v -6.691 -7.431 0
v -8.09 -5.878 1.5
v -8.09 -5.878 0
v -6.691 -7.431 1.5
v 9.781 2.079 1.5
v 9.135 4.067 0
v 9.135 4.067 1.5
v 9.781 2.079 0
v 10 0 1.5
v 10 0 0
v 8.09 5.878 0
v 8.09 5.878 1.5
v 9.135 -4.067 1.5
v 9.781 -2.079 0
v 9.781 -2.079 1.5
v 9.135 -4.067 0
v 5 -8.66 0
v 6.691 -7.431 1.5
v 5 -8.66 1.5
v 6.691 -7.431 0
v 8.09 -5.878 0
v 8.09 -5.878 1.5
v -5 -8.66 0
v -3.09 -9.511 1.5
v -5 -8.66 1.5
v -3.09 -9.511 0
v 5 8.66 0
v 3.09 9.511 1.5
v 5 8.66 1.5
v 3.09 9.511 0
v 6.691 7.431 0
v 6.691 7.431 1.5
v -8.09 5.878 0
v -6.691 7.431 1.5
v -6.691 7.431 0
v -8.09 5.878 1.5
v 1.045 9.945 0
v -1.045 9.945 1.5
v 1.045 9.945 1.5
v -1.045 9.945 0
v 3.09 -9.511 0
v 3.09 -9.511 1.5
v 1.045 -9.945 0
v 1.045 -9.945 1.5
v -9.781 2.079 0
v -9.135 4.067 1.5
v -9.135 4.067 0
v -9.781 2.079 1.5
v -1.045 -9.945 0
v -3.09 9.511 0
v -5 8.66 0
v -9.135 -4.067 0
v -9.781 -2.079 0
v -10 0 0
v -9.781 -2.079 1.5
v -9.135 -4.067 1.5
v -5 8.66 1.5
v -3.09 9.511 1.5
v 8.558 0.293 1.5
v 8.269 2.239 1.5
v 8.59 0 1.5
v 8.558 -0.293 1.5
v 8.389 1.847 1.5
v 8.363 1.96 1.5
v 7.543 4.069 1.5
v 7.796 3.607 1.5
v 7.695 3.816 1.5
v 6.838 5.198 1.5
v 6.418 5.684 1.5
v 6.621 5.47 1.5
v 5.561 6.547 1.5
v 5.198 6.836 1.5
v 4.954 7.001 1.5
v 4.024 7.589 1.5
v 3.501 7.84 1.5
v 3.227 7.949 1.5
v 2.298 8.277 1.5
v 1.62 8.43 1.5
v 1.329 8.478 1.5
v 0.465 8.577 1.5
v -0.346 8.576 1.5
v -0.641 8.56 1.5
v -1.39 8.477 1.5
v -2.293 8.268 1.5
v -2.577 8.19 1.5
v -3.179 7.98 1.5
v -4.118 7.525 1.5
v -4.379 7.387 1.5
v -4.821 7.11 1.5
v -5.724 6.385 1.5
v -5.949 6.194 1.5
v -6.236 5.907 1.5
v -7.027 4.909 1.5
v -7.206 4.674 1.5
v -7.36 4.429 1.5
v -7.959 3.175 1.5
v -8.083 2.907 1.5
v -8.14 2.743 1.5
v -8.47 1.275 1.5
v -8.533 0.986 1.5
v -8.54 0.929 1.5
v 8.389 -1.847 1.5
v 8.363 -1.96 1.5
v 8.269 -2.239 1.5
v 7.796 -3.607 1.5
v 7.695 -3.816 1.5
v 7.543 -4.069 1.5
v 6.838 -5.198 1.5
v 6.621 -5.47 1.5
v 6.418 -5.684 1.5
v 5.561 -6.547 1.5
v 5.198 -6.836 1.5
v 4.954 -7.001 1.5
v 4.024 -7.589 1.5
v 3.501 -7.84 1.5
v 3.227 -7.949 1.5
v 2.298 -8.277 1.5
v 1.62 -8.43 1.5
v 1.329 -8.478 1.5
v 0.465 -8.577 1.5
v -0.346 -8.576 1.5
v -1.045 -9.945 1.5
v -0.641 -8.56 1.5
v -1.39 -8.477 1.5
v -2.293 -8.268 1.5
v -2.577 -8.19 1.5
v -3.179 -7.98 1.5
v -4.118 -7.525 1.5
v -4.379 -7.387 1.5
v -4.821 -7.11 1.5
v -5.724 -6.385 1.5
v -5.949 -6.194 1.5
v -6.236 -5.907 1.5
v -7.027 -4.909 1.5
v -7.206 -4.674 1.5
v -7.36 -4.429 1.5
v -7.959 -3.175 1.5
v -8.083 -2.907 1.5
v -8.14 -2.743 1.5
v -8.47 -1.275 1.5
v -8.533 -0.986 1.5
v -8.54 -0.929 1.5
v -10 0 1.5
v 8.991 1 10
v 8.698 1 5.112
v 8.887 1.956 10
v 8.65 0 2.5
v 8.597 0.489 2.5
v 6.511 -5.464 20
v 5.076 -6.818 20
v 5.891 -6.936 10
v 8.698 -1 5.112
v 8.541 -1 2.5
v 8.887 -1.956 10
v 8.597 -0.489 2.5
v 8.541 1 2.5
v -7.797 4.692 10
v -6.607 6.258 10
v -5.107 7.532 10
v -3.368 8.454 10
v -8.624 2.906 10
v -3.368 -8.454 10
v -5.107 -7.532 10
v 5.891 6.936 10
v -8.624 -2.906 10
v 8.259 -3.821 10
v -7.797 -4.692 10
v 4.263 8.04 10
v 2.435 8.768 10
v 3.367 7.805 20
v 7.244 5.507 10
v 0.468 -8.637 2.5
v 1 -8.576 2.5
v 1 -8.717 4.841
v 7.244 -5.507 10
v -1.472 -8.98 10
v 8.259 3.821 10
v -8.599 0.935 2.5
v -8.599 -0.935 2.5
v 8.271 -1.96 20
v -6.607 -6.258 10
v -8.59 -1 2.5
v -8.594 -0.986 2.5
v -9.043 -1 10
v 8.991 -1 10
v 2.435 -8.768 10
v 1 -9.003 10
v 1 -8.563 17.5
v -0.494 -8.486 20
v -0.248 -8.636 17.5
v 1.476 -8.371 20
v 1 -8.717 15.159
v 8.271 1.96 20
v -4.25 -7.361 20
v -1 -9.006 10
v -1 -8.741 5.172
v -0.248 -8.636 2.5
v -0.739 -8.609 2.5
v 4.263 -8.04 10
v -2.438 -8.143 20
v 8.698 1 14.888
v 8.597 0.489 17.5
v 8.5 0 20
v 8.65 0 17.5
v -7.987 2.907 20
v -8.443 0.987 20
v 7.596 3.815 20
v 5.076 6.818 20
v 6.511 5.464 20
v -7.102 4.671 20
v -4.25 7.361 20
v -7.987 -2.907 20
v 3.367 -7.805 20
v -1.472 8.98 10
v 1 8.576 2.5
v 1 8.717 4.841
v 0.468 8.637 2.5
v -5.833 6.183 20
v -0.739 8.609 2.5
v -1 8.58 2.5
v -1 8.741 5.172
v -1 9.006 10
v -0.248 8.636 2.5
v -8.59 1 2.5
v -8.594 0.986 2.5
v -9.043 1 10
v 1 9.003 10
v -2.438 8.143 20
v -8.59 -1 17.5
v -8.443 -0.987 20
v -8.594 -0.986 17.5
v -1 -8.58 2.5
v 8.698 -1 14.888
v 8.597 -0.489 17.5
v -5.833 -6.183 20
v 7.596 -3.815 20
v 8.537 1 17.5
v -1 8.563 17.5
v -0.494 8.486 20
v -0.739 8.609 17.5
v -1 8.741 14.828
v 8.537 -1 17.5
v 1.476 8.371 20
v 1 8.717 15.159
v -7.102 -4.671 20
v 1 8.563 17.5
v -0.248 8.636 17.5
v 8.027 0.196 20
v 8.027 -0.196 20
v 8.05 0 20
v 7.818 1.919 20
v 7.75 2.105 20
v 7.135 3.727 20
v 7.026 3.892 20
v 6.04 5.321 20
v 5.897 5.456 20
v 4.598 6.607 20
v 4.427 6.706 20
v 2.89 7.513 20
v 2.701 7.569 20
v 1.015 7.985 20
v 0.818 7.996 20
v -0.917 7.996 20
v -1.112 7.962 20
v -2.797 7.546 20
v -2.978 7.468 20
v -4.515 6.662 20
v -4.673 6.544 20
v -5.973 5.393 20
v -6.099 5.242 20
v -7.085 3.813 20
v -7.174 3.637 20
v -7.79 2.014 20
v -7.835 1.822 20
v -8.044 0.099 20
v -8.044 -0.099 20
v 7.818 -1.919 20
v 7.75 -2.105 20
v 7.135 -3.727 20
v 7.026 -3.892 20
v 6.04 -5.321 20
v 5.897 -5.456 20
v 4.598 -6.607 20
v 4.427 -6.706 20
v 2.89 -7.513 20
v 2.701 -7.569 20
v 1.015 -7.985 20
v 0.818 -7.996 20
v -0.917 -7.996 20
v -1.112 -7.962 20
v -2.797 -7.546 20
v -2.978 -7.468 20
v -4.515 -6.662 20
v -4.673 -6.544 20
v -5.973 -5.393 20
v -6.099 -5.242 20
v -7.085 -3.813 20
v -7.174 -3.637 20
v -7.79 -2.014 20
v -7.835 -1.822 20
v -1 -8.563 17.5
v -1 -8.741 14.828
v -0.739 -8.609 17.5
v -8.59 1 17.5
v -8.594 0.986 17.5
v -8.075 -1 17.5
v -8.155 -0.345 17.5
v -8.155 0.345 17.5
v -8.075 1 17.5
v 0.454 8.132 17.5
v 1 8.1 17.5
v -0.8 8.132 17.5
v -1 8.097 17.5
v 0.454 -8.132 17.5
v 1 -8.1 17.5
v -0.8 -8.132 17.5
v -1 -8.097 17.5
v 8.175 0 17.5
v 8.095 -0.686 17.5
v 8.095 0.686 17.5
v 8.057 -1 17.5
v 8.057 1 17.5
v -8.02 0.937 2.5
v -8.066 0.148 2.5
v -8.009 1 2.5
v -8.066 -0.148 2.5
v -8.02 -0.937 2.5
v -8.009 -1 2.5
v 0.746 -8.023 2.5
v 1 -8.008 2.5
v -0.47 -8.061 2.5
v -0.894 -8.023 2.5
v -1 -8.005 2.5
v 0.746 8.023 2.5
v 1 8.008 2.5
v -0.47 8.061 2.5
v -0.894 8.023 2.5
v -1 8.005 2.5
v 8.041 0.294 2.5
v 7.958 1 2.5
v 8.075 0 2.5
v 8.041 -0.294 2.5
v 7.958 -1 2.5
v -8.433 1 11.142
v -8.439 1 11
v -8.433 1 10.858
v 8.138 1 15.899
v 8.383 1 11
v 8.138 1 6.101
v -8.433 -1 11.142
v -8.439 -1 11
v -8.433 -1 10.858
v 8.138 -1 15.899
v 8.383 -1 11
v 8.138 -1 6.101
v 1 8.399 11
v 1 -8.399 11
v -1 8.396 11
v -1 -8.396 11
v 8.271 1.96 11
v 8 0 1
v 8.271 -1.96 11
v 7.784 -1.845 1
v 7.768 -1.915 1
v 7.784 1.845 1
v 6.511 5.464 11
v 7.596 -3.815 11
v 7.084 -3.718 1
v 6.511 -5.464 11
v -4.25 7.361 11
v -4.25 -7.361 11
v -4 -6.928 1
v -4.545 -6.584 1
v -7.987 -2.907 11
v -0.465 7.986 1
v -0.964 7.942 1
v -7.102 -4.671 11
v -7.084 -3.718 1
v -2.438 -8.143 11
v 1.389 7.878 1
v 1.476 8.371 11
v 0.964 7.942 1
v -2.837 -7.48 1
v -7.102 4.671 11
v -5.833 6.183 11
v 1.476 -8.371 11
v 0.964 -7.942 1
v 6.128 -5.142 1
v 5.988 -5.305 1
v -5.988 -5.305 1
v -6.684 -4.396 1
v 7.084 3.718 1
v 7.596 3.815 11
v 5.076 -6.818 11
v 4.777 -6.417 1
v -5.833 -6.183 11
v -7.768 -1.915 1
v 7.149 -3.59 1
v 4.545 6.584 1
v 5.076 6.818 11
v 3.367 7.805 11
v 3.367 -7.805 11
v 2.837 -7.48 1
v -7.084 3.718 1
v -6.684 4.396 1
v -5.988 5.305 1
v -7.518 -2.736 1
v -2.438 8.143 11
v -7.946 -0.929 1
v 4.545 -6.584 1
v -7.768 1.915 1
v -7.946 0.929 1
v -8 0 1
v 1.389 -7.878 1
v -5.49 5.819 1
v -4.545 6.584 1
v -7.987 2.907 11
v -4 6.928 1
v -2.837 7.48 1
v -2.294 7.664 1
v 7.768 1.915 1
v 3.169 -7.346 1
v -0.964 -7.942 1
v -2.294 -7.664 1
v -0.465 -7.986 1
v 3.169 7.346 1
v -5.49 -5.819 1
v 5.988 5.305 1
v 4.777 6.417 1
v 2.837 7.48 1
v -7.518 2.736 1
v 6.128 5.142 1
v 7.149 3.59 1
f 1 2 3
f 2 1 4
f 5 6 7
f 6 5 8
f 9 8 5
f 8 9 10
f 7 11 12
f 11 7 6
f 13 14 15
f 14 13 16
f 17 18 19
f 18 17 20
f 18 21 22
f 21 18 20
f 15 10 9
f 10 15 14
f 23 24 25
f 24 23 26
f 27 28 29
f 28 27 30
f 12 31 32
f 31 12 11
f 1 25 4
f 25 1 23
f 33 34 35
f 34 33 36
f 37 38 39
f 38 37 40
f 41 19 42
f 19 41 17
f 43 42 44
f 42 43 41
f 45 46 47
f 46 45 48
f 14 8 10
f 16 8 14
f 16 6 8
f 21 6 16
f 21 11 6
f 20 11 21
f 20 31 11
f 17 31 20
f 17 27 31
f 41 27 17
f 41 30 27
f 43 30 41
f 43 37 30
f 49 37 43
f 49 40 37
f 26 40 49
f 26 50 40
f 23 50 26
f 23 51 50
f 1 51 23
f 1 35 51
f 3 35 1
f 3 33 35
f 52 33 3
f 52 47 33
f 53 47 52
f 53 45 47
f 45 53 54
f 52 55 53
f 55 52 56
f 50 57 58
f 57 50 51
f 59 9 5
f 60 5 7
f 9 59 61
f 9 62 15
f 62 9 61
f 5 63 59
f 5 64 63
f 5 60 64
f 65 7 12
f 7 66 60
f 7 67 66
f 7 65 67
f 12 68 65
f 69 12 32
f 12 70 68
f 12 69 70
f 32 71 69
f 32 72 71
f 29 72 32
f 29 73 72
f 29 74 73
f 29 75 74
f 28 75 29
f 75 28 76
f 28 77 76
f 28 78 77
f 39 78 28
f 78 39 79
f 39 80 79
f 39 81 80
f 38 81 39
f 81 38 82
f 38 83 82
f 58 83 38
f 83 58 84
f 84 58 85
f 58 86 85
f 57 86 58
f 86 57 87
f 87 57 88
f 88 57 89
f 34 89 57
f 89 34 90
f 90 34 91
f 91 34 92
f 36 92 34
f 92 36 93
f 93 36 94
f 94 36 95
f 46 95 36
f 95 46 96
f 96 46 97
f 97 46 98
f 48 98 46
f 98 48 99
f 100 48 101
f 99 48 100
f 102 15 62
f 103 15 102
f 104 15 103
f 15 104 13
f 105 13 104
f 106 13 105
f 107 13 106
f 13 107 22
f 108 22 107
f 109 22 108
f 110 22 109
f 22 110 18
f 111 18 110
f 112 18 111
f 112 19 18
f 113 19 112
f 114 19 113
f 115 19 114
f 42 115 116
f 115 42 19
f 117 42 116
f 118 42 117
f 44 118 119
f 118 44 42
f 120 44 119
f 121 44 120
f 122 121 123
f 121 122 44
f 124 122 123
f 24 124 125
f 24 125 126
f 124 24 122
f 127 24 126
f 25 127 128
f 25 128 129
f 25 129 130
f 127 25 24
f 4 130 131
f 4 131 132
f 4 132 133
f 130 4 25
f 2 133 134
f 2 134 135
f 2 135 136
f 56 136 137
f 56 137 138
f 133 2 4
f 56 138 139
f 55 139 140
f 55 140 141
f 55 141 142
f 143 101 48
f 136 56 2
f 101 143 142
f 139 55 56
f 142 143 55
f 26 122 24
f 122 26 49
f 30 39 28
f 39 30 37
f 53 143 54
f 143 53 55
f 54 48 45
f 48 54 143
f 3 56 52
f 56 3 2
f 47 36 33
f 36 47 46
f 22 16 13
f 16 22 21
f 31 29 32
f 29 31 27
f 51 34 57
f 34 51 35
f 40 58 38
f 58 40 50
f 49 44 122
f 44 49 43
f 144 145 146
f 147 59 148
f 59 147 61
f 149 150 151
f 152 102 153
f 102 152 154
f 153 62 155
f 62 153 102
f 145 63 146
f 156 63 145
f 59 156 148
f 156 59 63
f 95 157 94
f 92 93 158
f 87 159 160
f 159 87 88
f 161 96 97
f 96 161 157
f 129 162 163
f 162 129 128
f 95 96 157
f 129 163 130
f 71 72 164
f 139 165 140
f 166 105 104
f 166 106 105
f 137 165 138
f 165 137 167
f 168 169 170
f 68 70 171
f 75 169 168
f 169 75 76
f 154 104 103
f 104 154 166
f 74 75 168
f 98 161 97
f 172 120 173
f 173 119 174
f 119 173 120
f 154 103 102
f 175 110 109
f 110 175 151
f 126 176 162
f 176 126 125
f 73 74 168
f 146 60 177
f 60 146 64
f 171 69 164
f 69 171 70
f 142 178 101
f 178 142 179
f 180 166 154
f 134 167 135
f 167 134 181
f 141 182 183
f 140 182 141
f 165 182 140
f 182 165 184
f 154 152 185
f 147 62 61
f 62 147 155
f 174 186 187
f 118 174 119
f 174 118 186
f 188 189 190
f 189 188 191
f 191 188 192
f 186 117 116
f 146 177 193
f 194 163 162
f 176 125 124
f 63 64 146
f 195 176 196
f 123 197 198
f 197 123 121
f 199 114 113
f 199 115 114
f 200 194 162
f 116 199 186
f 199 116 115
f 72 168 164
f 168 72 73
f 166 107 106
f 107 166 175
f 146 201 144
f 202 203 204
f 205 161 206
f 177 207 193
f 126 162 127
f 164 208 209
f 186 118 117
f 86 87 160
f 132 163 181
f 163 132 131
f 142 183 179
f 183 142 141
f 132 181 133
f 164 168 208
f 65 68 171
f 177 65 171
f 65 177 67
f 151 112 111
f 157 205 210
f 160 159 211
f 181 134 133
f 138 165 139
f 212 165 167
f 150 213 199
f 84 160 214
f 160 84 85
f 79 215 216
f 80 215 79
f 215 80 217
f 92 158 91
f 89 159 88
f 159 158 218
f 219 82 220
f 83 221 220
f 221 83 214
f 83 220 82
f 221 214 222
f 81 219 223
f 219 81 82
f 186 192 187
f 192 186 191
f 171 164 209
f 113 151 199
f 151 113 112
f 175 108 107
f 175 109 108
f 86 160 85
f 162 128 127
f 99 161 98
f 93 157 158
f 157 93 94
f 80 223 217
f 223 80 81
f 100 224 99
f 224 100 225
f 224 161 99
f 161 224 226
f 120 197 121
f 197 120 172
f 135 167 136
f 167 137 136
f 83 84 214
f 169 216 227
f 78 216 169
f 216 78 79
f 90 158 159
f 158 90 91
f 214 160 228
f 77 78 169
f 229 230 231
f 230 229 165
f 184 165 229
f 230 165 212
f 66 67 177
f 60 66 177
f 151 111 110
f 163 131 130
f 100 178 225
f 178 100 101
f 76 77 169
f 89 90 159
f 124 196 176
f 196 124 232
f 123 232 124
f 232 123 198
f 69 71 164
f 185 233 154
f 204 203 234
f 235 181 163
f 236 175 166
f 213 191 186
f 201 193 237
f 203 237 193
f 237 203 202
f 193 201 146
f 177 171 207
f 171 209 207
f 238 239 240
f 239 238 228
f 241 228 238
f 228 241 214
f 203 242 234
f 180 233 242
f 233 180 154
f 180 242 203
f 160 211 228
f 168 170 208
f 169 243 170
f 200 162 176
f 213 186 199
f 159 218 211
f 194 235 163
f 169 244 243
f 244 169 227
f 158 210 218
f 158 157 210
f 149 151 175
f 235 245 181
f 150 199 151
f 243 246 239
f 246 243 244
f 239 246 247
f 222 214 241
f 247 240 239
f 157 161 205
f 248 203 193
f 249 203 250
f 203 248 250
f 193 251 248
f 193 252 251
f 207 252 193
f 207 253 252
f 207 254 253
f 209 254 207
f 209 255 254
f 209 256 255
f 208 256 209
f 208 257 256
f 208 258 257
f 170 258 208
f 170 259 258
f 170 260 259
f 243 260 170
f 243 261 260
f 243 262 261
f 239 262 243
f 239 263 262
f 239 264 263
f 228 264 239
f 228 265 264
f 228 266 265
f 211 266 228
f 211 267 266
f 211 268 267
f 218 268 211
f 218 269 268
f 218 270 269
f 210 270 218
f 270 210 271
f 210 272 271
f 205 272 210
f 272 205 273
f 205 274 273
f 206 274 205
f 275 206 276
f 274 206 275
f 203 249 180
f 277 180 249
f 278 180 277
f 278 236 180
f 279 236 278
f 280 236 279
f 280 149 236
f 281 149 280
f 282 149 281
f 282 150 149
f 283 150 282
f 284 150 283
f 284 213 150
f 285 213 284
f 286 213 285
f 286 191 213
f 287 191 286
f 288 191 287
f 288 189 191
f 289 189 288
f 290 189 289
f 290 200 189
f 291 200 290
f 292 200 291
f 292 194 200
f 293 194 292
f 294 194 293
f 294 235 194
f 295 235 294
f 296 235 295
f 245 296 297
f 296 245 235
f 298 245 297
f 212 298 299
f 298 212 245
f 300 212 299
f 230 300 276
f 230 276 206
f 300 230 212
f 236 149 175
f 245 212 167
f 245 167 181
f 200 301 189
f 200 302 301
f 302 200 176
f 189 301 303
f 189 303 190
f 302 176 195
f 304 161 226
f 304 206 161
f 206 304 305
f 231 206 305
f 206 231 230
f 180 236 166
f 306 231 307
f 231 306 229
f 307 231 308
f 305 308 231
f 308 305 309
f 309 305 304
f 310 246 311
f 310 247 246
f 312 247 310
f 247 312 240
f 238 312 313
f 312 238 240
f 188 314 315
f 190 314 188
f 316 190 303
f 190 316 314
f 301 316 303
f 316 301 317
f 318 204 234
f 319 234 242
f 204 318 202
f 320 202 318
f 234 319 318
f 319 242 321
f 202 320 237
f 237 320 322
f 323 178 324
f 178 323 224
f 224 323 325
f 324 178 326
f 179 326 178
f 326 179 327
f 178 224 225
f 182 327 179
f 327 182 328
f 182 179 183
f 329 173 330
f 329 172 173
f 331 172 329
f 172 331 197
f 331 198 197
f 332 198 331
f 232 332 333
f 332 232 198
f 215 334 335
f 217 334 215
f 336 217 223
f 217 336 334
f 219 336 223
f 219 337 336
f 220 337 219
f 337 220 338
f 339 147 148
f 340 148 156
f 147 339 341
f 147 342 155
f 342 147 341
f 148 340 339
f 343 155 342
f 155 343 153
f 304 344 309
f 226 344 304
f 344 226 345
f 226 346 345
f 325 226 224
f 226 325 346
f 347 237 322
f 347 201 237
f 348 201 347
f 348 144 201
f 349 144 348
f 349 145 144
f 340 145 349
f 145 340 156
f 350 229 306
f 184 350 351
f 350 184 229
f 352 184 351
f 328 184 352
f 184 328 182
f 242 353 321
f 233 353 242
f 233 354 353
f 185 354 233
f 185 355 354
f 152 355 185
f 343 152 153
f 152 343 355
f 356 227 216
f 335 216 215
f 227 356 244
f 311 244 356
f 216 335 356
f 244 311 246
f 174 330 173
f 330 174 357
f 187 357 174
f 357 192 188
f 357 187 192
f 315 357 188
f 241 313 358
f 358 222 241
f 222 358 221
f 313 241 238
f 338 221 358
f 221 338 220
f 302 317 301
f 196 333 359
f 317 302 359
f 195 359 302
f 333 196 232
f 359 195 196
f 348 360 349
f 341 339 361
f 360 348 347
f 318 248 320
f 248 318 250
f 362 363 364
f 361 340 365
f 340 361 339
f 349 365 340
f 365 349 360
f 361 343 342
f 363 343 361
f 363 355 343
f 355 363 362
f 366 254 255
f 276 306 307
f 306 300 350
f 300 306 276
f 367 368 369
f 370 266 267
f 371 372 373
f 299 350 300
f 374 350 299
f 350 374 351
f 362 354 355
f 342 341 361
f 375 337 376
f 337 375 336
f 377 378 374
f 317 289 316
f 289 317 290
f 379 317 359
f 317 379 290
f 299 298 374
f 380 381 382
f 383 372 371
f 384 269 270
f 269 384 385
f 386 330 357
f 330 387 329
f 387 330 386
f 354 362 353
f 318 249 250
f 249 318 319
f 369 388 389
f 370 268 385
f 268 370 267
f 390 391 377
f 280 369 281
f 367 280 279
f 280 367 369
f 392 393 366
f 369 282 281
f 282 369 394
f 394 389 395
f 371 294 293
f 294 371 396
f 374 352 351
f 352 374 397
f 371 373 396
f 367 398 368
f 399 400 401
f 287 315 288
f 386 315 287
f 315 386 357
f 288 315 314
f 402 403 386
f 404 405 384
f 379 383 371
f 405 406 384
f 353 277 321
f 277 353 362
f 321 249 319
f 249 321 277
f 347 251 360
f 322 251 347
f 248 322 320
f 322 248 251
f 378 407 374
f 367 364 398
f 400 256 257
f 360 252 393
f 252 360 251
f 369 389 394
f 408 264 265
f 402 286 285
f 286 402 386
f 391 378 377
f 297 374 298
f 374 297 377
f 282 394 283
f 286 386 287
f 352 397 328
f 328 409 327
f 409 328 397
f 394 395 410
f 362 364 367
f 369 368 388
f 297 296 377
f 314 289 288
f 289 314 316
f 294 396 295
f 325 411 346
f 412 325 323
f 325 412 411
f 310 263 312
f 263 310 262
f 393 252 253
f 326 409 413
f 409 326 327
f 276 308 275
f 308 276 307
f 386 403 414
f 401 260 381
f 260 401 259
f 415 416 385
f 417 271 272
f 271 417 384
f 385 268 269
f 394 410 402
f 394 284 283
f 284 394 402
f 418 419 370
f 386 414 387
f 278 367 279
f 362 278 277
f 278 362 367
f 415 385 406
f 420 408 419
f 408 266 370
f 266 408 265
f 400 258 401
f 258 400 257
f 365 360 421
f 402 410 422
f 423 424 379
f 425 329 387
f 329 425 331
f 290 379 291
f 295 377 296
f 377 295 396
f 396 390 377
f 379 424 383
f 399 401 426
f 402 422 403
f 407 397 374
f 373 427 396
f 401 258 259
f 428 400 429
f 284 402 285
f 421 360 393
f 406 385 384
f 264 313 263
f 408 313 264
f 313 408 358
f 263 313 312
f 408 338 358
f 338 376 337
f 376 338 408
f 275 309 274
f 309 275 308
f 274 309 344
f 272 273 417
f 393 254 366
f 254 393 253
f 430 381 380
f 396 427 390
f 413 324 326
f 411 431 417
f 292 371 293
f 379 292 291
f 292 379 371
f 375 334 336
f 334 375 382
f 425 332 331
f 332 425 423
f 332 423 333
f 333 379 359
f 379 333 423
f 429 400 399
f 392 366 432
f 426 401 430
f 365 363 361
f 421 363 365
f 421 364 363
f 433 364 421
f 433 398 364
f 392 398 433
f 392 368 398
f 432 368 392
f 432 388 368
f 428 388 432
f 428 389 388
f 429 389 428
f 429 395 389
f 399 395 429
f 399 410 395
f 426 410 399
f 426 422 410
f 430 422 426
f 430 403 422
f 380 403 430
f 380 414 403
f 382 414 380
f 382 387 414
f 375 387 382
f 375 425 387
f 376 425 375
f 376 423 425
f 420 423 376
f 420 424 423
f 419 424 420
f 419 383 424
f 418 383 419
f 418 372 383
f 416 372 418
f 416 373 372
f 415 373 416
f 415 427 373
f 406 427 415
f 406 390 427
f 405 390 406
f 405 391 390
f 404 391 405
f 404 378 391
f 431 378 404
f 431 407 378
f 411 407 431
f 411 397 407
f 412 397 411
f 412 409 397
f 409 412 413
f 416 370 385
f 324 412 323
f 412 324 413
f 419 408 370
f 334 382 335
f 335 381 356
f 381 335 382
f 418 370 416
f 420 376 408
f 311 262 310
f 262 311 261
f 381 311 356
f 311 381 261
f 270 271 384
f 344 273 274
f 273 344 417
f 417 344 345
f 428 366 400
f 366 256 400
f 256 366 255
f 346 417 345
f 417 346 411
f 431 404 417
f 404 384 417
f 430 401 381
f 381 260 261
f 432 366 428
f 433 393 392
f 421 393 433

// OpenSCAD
difference(){
    union(){
        cylinder(d=20,h=1.5);
        hull(){
            cylinder(d1=17,d2=18.2,h=10);
            cylinder(d=17,h=20);
        }
    }
    translate([0,0,1])
        hull(){
            cylinder(d1=16,d2=17,h=10);
            cylinder(d=16,h=20);
        }
    translate([0,0,10])
    {
        cube([20,2,15],center=true);
        cube([2,20,15],center=true);
    }
}
